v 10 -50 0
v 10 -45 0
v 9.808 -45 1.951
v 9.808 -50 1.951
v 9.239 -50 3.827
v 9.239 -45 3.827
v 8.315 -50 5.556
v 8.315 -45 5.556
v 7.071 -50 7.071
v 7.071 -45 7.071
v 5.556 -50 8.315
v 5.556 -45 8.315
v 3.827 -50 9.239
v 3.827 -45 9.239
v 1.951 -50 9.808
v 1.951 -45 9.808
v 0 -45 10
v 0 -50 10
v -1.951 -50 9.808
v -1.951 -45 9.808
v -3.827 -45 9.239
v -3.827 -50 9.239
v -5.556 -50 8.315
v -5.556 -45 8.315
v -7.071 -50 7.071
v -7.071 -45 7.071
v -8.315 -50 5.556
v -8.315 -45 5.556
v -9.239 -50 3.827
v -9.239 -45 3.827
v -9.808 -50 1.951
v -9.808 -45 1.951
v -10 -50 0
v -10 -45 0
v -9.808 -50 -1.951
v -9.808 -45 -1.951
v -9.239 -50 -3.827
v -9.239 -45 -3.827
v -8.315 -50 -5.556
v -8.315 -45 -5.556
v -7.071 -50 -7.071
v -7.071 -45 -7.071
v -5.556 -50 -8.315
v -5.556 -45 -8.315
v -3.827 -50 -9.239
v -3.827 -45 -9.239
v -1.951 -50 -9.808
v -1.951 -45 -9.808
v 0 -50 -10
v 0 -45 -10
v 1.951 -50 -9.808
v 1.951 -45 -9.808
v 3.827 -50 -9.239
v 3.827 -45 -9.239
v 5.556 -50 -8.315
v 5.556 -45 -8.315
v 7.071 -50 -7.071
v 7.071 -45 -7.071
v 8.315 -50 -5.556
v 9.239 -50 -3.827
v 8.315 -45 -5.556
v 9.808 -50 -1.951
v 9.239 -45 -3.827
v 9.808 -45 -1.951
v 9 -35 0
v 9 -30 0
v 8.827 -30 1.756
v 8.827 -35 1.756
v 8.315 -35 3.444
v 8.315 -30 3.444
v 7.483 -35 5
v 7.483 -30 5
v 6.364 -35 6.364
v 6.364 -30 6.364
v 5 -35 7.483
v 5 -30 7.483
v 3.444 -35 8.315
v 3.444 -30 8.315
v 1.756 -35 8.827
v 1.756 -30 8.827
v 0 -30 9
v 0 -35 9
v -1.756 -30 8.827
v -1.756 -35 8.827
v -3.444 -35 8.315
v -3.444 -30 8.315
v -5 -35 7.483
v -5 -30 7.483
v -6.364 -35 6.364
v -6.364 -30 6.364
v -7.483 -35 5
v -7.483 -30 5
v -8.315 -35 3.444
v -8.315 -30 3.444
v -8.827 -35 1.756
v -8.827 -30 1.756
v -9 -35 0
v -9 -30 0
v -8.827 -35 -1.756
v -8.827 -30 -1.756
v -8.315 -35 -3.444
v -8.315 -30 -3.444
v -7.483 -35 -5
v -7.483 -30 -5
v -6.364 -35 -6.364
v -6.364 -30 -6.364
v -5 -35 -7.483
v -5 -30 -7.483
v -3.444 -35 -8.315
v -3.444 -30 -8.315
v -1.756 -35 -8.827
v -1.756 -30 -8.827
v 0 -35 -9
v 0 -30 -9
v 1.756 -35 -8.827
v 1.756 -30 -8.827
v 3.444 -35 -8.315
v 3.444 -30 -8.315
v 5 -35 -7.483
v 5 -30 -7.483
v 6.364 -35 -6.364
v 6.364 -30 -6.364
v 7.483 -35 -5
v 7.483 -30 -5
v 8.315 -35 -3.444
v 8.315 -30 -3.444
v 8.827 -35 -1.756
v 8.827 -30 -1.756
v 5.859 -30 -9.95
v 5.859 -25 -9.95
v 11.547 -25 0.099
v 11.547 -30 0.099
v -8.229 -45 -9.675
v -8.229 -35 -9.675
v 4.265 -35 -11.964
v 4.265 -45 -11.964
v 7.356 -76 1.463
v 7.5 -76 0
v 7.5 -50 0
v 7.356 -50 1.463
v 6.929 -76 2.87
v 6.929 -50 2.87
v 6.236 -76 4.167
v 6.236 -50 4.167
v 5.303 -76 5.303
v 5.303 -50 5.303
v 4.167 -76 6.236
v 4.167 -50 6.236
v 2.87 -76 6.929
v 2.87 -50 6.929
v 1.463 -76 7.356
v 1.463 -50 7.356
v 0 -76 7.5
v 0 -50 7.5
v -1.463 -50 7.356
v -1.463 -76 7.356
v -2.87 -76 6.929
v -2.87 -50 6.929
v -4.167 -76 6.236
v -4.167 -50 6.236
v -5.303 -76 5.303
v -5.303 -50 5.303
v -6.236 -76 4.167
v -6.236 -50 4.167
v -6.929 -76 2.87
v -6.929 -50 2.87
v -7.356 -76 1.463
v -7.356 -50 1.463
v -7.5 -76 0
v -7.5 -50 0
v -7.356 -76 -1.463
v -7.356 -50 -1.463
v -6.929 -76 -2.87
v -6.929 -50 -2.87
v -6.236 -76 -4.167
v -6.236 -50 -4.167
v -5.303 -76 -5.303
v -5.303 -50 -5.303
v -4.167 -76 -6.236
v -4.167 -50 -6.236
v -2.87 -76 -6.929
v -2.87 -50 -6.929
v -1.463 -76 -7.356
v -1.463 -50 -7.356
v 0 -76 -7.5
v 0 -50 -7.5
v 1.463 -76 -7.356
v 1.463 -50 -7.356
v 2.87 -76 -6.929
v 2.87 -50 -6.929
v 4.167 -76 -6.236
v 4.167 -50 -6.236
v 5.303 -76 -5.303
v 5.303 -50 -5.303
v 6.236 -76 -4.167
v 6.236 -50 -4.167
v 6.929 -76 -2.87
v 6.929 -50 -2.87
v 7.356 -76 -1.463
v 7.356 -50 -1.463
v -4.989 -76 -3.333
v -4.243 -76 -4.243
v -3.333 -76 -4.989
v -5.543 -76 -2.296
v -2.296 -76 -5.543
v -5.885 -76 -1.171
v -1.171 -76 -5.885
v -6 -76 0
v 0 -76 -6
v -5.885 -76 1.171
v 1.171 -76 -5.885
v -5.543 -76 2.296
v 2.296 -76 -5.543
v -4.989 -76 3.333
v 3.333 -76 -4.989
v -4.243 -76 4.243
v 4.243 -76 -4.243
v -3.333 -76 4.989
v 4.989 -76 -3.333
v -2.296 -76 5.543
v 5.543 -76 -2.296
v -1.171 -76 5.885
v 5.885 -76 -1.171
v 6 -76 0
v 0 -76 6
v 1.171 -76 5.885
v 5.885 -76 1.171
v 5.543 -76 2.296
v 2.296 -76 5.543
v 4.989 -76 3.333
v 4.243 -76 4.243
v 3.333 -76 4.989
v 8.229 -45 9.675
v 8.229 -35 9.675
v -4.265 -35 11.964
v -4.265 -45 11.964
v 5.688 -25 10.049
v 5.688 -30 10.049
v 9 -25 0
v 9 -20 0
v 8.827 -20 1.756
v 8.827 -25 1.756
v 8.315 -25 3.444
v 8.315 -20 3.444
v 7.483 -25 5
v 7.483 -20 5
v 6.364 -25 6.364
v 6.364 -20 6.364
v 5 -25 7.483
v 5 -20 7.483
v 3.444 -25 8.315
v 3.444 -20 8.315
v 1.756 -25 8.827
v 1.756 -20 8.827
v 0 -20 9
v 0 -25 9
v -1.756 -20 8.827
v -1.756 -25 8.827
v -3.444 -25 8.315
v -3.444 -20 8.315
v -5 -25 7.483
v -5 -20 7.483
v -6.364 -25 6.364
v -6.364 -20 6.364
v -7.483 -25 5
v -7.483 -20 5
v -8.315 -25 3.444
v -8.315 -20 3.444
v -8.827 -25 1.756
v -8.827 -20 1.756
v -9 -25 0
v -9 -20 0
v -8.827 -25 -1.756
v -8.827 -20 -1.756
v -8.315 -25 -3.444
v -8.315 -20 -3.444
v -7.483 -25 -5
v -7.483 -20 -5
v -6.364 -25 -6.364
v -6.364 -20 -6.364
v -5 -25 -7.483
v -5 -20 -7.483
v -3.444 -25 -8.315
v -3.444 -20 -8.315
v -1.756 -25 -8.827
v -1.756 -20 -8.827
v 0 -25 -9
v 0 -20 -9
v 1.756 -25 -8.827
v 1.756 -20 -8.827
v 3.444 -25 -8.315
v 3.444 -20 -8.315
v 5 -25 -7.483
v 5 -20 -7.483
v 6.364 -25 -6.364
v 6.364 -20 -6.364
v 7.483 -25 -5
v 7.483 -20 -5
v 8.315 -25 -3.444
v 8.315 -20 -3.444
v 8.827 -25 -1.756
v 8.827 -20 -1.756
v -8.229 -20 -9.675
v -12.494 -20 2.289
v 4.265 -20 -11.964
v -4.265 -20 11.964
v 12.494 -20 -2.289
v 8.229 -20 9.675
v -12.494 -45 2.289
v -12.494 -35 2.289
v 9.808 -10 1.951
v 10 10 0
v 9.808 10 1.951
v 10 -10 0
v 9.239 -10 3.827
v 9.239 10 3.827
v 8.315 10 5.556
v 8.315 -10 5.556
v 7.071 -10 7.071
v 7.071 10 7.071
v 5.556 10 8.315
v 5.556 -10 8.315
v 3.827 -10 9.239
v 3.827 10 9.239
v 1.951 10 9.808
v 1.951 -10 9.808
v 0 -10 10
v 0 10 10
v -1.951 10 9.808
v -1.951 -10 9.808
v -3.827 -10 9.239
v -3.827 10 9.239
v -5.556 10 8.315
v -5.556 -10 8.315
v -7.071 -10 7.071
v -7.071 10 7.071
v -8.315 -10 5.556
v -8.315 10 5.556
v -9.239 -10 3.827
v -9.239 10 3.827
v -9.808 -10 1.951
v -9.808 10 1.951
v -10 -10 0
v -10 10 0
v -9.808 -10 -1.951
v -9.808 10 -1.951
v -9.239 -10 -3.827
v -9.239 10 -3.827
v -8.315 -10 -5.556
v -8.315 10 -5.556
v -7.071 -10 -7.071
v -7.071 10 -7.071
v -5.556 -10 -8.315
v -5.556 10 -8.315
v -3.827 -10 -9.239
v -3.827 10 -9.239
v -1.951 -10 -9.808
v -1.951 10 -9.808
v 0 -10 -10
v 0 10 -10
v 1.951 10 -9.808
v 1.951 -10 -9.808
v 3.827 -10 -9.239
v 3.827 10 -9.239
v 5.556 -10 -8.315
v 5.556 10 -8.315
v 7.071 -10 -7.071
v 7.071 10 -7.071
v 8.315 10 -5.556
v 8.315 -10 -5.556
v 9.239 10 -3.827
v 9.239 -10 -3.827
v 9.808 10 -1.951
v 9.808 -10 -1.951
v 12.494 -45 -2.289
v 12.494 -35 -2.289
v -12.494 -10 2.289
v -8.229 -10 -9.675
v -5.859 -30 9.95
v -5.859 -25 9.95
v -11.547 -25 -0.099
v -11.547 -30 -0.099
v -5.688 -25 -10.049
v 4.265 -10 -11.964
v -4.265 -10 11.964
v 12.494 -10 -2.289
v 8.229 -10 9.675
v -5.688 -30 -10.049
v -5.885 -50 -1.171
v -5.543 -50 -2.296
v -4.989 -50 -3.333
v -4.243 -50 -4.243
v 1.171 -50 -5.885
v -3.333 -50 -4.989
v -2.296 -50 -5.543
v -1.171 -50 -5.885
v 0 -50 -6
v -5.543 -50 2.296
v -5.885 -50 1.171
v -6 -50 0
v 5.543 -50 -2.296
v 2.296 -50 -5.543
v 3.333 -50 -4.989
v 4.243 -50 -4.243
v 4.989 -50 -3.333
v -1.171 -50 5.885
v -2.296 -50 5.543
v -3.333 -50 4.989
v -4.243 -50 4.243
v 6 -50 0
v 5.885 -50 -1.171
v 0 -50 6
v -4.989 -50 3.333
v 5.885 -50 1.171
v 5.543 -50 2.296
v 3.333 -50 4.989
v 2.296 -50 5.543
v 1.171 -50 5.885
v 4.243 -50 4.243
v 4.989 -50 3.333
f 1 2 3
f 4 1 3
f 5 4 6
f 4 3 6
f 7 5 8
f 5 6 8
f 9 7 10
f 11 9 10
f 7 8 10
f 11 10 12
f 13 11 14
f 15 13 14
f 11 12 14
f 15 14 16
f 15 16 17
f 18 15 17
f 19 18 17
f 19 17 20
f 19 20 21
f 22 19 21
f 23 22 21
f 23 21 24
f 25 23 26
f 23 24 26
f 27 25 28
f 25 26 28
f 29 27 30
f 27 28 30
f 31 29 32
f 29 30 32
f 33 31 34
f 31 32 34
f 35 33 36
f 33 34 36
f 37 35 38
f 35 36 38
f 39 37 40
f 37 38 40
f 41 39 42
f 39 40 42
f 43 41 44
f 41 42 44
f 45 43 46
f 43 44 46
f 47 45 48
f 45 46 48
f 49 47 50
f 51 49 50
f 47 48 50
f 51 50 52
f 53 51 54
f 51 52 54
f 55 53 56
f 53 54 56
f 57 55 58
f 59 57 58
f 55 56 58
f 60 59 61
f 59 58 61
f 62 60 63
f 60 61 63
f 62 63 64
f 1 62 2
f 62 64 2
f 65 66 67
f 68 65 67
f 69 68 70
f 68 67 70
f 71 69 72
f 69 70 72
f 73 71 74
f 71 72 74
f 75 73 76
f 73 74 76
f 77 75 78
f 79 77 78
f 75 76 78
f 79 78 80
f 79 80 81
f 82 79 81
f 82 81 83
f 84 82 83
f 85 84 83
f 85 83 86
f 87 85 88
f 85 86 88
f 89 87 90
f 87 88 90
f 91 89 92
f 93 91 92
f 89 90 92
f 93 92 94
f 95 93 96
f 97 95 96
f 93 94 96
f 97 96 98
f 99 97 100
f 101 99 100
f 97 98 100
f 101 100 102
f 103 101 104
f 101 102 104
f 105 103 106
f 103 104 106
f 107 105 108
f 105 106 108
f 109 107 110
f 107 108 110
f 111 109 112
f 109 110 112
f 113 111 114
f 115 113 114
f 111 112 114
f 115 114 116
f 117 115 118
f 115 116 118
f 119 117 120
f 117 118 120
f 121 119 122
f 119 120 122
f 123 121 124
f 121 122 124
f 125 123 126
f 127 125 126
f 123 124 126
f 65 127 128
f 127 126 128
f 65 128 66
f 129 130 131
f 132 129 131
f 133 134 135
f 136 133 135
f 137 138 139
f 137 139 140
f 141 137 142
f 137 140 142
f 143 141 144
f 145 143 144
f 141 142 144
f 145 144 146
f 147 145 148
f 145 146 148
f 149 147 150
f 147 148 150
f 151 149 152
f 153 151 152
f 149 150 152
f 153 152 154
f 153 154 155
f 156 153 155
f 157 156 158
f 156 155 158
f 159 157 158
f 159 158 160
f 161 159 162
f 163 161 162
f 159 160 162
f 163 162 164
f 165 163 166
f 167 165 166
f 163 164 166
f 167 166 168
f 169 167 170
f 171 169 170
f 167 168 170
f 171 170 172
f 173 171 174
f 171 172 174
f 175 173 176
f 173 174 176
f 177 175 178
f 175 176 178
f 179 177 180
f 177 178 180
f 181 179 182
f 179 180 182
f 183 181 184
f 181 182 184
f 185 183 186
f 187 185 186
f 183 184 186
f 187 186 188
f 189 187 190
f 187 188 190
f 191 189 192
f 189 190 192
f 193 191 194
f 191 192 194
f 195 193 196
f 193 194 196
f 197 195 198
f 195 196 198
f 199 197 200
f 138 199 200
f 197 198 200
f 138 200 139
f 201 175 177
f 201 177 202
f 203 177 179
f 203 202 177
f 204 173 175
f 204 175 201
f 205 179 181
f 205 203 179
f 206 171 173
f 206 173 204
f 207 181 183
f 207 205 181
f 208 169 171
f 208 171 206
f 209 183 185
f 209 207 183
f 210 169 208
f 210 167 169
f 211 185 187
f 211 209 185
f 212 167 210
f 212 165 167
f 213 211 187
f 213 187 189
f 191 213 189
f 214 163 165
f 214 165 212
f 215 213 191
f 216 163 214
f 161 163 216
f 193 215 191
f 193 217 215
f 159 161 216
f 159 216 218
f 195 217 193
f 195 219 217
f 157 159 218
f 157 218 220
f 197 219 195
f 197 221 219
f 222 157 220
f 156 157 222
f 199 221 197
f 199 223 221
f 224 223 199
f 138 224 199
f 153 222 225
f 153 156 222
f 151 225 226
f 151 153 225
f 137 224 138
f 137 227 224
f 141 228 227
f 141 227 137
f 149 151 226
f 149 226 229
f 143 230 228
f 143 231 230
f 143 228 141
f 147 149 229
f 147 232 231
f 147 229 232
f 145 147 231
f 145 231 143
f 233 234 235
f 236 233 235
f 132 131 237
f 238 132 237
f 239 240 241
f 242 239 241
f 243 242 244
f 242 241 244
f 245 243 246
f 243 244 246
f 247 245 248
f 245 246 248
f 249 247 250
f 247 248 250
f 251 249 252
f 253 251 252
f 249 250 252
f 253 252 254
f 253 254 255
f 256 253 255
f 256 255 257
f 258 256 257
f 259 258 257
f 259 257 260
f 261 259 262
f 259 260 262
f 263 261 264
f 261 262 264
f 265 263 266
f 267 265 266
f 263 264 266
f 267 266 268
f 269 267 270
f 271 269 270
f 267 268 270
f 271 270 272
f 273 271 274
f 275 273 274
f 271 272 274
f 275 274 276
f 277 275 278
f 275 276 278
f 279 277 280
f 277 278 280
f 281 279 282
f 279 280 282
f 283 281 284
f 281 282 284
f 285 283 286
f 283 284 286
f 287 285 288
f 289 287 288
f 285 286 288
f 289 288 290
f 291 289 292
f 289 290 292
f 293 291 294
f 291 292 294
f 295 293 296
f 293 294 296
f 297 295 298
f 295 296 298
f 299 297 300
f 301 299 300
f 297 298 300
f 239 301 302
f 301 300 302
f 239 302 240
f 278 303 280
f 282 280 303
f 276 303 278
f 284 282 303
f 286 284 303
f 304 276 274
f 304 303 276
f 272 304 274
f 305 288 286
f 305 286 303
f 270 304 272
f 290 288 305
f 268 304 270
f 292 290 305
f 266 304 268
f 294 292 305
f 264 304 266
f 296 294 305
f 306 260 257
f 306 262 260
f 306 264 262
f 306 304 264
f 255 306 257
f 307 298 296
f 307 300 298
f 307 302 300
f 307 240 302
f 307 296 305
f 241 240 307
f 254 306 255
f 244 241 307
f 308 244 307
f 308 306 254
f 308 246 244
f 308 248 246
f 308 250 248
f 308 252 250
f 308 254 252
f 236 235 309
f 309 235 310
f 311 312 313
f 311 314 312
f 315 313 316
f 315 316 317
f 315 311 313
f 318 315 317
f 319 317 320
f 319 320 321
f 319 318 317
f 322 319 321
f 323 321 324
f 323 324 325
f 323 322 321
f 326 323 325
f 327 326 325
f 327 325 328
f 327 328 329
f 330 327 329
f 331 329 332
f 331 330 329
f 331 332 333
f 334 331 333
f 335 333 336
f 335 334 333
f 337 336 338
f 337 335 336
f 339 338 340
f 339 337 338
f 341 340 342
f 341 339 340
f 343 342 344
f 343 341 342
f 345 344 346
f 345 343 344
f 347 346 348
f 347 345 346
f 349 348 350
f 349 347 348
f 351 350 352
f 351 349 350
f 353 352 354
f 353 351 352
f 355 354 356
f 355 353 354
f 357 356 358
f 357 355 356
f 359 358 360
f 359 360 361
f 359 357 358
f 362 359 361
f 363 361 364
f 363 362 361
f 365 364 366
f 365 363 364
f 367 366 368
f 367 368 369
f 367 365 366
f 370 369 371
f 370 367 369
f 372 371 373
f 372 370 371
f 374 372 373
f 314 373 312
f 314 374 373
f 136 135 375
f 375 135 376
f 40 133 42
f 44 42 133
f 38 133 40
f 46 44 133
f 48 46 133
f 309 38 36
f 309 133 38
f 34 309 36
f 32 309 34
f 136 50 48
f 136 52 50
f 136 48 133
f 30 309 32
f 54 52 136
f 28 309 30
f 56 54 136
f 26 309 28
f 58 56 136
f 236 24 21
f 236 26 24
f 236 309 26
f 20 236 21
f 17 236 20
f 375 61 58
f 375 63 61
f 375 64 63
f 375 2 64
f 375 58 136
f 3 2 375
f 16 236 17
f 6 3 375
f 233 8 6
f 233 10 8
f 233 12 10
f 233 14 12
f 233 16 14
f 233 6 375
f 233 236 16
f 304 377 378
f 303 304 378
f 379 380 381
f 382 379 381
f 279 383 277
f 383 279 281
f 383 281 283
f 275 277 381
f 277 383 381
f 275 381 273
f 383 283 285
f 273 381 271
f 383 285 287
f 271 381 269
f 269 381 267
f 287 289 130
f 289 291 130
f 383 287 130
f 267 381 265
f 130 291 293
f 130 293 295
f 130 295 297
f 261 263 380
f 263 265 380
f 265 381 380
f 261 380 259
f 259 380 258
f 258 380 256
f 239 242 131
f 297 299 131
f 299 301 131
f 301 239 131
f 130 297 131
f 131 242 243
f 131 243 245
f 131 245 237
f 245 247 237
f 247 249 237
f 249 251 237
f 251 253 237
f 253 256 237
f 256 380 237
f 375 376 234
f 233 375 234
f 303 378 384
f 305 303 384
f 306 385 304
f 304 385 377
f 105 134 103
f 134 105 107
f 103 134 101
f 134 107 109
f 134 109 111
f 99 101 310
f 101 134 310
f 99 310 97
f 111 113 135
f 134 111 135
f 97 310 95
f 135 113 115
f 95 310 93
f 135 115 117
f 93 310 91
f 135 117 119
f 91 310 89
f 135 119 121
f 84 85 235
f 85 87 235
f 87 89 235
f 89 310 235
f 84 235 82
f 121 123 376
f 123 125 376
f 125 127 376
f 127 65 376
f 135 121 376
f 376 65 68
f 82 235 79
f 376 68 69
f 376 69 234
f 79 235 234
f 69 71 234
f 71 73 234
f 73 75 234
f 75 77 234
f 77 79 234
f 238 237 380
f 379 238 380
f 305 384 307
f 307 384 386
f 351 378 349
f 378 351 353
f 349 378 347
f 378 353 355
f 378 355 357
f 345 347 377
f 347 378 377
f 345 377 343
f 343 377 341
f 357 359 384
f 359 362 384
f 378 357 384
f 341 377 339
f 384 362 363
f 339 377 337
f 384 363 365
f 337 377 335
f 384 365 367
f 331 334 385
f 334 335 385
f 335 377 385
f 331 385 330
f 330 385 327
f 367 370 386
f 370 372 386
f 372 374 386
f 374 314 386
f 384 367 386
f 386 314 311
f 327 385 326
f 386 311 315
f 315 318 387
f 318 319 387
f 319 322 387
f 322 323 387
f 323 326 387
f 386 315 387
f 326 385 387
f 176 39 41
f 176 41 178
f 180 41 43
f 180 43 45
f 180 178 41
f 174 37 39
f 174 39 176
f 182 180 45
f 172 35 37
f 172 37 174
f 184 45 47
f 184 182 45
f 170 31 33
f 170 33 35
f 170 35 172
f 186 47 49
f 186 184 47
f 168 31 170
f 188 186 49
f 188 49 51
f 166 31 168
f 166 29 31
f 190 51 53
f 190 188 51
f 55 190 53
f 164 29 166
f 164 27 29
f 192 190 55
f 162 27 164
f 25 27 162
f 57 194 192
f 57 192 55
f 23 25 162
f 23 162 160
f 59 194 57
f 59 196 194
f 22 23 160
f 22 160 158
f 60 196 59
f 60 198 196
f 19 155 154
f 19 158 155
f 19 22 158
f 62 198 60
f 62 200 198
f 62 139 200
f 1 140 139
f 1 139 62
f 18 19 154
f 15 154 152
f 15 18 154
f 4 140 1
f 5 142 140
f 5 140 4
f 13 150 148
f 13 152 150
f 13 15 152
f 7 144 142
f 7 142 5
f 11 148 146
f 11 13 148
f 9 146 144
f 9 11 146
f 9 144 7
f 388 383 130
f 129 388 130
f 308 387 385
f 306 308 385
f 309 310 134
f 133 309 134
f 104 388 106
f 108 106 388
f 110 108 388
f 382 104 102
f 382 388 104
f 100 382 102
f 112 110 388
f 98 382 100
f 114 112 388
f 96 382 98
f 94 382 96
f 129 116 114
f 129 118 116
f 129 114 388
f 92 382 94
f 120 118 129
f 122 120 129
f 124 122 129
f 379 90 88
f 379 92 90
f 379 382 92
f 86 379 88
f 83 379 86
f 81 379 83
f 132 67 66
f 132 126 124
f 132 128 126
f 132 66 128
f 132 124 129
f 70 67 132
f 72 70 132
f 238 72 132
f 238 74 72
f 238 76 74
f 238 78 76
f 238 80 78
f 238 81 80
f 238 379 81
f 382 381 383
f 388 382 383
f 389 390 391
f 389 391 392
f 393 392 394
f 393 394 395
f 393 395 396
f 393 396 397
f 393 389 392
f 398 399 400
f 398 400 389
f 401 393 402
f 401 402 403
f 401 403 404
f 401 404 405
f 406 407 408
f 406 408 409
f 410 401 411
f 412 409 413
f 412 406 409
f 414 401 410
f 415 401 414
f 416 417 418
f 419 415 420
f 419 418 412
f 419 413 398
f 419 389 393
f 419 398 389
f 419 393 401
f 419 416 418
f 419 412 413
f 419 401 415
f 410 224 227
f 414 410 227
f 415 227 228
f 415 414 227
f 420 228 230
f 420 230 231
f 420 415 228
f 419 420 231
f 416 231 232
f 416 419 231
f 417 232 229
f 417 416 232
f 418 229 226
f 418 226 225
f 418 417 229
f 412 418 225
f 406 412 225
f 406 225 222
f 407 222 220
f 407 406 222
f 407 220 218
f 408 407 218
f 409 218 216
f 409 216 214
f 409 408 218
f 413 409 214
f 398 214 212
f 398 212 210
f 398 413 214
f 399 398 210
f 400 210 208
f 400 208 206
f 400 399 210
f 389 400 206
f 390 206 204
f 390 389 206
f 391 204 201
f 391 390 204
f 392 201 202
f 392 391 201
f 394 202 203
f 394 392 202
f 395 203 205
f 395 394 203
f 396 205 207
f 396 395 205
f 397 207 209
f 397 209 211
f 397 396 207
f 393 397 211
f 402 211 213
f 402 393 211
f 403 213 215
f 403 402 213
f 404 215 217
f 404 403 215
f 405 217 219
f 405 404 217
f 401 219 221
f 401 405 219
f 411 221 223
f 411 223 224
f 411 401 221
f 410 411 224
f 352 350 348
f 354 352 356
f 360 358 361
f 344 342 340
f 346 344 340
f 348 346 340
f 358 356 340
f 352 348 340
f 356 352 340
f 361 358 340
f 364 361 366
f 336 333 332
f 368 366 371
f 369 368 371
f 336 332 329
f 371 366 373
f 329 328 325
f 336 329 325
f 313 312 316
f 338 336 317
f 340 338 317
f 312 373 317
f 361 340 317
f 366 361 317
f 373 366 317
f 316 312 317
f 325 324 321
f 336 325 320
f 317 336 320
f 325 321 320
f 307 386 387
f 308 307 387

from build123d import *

# Parameters (mm, degrees)
F0_R      = 10
F1_DEPTH  = 10
F3_DEPTH  = 10
F4_R      = 9
F5_DEPTH  = 5
F7_DEPTH  = 5
F8_R      = 9
F9_DEPTH  = 5
F11_DEPTH = 10
F12_R     = 10
F13_DEPTH = 5
F14_R     = 7.5
F14_R_2   = 6
F16_DEPTH = 26


with BuildPart() as f1:
    # F0 (on Front) → F1 (new body, symmetric)
    with BuildSketch(Plane.XZ):
        Circle(F0_R)
    extrude(amount=F1_DEPTH, both=True)

    # F2 (on face) → F3 (join)
    with BuildSketch(Plane.XZ.offset(10)):
        Polygon((4.264543, -11.964406), (12.493751, -2.289001), (8.229208, 9.675405), (-4.264543, 11.964406), (-12.493751, 2.289001), (-8.229208, -9.675405), align=None)
    extrude(amount=F3_DEPTH)

    # F4 (on face) → F5 (join)
    with BuildSketch(Plane.XZ.offset(20)):
        Circle(F4_R)
    extrude(amount=F5_DEPTH)

    # F6 (on face) → F7 (join)
    with BuildSketch(Plane.XZ.offset(25)):
        Polygon((5.858879, -9.95022), (11.546582, 0.098828), (5.687704, 10.049048), (-5.858879, 9.95022), (-11.546582, -0.098828), (-5.687704, -10.049048), align=None)
    extrude(amount=F7_DEPTH)

    # F8 (on face) → F9 (join)
    with BuildSketch(Plane.XZ.offset(30)):
        Circle(F8_R)
    extrude(amount=F9_DEPTH)

    # F10 (on face) → F11 (join)
    with BuildSketch(Plane.XZ.offset(35)):
        Polygon((8.229208, 9.675405), (-4.264543, 11.964406), (-12.493751, 2.289001), (-8.229208, -9.675405), (4.264543, -11.964406), (12.493751, -2.289001), align=None)
    extrude(amount=F11_DEPTH)

    # F12 (on face) → F13 (join)
    with BuildSketch(Plane.XZ.offset(45)):
        Circle(F12_R)
    extrude(amount=F13_DEPTH)

    # F14 (on face) → F16 (join, through all)
    with BuildSketch(Plane.XZ.offset(50)):
        Circle(F14_R)
        Circle(F14_R_2, mode=Mode.SUBTRACT)
    extrude(amount=F16_DEPTH)


solid = f1.part
